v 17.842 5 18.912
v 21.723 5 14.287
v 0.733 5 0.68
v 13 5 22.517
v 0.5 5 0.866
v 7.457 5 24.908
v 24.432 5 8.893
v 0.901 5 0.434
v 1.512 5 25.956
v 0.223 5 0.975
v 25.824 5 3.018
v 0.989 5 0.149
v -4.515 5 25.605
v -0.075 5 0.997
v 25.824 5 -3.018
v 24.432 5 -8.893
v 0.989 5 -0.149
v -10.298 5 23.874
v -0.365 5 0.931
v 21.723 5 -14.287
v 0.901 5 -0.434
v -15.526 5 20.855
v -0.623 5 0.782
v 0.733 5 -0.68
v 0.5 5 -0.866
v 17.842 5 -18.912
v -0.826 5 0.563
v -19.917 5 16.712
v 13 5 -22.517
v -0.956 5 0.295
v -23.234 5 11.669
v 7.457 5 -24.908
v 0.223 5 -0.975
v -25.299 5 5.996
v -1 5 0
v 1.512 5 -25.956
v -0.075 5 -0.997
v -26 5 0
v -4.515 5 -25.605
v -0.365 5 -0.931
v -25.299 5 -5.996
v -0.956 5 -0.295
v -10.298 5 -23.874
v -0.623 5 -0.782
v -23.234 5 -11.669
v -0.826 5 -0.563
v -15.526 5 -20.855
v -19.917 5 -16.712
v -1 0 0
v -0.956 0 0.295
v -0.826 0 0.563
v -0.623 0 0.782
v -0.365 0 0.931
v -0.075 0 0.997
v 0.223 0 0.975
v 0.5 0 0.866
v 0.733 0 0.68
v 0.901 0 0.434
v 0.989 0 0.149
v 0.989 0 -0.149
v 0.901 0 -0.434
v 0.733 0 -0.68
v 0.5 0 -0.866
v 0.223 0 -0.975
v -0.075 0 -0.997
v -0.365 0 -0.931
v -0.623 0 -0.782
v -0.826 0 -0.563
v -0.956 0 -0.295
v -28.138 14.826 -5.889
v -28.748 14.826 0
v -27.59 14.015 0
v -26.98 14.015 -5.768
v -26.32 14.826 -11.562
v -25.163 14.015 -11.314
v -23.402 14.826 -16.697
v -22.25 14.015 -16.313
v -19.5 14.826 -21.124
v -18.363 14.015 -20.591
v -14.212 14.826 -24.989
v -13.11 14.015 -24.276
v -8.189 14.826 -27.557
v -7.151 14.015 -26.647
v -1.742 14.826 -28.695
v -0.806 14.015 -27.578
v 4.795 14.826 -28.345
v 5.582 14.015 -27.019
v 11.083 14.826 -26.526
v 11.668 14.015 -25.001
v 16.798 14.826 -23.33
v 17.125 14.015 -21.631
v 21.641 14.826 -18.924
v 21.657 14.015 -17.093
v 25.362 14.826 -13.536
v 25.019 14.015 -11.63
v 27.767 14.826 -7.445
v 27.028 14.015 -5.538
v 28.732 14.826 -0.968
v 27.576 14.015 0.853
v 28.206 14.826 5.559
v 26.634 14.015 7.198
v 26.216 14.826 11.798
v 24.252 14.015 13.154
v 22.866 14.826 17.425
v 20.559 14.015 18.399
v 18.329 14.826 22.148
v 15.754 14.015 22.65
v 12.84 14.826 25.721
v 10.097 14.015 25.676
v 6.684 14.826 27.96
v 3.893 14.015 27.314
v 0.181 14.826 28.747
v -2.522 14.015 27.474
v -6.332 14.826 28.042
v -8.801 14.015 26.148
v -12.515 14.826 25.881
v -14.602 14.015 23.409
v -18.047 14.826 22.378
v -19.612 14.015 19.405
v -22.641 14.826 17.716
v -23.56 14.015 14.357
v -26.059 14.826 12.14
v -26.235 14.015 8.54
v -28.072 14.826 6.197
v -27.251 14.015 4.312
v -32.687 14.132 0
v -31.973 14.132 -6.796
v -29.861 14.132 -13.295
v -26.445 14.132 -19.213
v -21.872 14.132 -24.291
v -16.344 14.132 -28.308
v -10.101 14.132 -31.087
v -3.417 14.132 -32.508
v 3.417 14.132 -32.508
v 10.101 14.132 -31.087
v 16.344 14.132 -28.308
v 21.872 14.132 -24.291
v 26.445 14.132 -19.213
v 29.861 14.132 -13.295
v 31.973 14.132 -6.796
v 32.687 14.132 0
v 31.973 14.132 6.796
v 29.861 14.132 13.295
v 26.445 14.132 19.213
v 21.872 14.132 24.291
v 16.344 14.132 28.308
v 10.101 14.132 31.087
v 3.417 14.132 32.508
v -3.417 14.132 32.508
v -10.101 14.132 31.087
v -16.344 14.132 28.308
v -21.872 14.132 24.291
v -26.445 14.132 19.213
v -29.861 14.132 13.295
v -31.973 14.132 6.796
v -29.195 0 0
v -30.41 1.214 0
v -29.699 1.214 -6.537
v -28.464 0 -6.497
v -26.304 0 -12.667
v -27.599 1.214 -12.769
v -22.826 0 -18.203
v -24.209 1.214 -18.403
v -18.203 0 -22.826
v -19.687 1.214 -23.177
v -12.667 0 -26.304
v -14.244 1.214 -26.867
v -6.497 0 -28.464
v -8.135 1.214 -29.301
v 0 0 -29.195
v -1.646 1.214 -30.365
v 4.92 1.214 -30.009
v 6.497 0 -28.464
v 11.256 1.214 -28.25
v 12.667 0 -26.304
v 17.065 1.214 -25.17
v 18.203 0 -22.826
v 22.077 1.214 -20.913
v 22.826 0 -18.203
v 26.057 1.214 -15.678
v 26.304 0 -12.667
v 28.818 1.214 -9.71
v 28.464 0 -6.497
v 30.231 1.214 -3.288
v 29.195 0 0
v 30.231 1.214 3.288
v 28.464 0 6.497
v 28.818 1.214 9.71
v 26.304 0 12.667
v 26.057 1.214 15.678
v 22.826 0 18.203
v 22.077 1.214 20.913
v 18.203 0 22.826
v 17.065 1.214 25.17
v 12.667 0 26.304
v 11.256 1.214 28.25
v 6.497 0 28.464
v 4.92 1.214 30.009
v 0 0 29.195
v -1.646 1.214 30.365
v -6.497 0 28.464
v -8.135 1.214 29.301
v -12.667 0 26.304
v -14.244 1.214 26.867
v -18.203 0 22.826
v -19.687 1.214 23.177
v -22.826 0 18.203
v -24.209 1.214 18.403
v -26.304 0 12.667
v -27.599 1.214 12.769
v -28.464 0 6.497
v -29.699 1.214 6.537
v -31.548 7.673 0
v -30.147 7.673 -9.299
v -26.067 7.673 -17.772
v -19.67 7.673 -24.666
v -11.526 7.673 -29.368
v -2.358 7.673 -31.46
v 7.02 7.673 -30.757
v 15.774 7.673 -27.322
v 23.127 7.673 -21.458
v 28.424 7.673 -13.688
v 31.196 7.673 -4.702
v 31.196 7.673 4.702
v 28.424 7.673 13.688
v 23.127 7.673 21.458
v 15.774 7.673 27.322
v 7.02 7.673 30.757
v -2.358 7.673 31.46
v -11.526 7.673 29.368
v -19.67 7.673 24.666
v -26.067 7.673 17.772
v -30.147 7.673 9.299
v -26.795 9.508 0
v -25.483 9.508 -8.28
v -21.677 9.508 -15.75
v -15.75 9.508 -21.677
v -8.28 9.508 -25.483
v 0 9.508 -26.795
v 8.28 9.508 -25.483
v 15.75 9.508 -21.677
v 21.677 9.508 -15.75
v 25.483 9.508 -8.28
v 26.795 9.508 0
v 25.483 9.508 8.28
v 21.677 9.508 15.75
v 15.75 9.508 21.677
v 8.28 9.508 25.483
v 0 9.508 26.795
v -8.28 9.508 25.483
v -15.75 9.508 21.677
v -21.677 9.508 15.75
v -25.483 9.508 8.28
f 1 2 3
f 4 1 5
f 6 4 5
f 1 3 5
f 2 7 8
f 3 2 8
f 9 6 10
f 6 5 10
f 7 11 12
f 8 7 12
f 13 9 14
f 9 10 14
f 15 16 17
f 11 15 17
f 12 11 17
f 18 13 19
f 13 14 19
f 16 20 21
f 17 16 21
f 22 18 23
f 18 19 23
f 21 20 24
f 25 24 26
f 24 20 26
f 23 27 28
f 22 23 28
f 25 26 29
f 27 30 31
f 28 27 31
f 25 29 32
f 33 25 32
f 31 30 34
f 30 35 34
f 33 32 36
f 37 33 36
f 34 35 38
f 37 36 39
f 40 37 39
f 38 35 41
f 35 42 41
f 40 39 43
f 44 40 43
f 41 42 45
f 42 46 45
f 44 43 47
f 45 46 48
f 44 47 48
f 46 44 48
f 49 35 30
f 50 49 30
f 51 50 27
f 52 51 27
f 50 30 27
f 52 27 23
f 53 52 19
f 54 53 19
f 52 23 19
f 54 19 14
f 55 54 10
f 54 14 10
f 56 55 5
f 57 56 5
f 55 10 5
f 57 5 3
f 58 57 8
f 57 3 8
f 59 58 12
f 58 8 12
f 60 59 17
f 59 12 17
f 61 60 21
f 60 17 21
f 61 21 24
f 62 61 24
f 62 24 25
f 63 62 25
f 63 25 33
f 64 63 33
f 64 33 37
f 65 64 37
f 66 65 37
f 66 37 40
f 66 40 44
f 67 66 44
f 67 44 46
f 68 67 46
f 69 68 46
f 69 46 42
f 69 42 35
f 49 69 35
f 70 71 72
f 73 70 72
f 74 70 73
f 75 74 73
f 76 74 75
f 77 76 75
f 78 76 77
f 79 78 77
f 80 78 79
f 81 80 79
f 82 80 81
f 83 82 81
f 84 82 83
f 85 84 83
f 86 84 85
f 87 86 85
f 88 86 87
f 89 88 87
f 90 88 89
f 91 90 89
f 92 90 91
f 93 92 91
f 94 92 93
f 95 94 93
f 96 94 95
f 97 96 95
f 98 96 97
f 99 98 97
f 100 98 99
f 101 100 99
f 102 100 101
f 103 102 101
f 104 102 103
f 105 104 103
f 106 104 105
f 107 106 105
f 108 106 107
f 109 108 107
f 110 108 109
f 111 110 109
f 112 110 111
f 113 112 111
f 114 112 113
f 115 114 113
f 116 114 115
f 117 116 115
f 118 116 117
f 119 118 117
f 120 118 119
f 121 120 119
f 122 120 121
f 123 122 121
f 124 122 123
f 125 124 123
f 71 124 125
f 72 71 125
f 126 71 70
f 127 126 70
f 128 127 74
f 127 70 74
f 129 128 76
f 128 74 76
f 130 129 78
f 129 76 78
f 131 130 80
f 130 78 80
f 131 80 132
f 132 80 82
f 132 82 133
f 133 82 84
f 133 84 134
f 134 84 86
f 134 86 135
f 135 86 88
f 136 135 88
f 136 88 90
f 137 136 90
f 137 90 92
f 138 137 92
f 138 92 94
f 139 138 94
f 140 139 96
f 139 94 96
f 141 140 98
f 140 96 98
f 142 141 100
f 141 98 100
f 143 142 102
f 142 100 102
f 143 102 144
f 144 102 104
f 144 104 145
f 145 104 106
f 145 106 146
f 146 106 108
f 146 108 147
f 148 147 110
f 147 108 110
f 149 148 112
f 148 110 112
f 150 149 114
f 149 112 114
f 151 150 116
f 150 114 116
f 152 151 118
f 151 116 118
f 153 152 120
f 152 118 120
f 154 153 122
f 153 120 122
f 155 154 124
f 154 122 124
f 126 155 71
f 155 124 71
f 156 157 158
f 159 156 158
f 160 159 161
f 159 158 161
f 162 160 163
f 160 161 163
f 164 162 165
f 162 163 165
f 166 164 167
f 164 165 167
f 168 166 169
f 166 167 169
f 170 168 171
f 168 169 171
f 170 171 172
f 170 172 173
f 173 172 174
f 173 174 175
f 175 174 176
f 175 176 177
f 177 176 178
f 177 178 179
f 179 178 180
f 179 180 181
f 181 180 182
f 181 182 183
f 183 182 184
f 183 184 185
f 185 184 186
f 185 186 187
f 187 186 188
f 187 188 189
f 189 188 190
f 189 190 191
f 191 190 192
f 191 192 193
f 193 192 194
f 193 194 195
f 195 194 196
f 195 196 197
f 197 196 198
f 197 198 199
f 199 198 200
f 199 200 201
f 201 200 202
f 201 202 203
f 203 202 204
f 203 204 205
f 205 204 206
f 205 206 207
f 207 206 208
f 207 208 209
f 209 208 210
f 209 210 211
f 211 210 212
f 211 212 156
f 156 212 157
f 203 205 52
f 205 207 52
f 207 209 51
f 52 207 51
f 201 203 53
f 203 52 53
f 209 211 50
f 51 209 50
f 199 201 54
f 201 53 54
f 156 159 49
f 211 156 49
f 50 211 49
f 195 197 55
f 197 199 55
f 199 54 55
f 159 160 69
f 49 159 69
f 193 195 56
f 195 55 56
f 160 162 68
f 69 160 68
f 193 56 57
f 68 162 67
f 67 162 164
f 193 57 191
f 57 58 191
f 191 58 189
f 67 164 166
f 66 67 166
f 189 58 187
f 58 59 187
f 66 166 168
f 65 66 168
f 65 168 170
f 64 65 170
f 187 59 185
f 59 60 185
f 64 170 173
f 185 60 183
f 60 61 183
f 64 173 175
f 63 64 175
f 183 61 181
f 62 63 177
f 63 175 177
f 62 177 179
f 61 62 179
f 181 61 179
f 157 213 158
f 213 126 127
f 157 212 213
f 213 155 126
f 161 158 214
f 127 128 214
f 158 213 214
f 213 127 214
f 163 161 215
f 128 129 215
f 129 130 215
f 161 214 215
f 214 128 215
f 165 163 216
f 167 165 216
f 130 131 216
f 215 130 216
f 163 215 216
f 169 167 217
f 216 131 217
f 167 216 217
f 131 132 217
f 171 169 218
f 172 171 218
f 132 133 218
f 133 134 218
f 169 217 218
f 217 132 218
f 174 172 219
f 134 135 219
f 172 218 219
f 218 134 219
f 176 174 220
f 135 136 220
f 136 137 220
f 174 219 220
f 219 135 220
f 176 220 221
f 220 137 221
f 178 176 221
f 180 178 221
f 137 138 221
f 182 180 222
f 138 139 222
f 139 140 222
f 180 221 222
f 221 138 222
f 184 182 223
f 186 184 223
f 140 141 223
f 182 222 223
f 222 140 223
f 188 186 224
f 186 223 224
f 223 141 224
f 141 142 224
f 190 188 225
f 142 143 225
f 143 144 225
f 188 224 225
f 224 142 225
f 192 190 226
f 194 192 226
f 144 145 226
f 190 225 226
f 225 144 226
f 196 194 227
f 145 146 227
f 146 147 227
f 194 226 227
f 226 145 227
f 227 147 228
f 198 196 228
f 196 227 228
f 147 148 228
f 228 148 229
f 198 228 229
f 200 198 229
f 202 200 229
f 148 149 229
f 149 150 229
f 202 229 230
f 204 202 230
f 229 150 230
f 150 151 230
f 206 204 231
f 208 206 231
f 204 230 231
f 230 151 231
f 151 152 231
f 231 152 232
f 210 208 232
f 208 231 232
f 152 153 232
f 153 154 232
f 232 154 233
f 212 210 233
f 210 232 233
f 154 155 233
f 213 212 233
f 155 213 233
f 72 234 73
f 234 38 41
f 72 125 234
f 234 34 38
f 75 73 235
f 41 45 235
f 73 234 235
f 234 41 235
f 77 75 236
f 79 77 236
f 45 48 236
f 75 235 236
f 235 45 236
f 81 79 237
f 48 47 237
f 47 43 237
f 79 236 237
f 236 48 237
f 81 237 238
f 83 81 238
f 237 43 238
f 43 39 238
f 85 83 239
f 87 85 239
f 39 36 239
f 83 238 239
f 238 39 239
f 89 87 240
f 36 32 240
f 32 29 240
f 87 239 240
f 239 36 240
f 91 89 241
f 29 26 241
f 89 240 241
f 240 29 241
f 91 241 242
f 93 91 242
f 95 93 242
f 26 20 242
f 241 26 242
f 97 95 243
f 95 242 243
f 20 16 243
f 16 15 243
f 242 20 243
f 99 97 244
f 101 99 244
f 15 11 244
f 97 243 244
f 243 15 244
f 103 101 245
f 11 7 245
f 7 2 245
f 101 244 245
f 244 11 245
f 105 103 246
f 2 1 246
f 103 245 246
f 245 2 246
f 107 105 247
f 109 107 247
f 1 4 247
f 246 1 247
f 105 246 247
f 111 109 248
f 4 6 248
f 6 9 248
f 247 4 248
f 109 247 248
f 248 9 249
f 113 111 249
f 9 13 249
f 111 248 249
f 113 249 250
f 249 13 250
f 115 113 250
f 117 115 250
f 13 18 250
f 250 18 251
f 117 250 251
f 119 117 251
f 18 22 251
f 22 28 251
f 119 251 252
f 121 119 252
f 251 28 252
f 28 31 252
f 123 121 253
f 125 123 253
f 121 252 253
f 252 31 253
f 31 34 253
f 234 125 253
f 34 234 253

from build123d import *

# Parameters (mm, degrees)
CHAMFER_1_SIZE      = 1
CHAMFER_1_SIZE2     = 1.232803052
CHAMFER_2_SIZE      = 1
SKETCH_4_R          = 1
CUT_EXTRUDE_1_DEPTH = 10


with BuildPart() as part:
    # 草图3 → 旋转1 (revolve)
    with BuildSketch(Plane.XY):
        Polygon((0, 0), (-30.195498156, 0), (-32.687308572, 14.131759112), (-27.763269807, 15), (-26, 5), (0, 5), align=None)
    revolve(axis=Axis((0, 5, 0), (0, -1, 0)))

    # 倒角1
    chamfer_1_edges = [part.edges().sort_by_distance(p)[0] for p in [
        (30.195498156, 0, 0),
    ]]
    chamfer_1_side = [part.faces().sort_by_distance(p)[0] for p in [
        (0, 0, 0),
    ]]
    chamfer(chamfer_1_edges, length=CHAMFER_1_SIZE, length2=CHAMFER_1_SIZE2, reference=chamfer_1_side[0])

    # 倒角2
    chamfer_2_edges = [part.edges().sort_by_distance(p)[0] for p in [
        (27.763269807, 15, 0),
    ]]
    chamfer(chamfer_2_edges, length=CHAMFER_2_SIZE)

    # 草图4 → 切除-拉伸1 (cut)
    with BuildSketch(Plane(origin=(0, 5, 0), x_dir=(1, 0, 0), z_dir=(0, 1, 0))):
        with Locations(Location((0, 0, 0), (0, 0, 180))):
            Circle(SKETCH_4_R)
    extrude(amount=-CUT_EXTRUDE_1_DEPTH, mode=Mode.SUBTRACT)


solid = part.part
